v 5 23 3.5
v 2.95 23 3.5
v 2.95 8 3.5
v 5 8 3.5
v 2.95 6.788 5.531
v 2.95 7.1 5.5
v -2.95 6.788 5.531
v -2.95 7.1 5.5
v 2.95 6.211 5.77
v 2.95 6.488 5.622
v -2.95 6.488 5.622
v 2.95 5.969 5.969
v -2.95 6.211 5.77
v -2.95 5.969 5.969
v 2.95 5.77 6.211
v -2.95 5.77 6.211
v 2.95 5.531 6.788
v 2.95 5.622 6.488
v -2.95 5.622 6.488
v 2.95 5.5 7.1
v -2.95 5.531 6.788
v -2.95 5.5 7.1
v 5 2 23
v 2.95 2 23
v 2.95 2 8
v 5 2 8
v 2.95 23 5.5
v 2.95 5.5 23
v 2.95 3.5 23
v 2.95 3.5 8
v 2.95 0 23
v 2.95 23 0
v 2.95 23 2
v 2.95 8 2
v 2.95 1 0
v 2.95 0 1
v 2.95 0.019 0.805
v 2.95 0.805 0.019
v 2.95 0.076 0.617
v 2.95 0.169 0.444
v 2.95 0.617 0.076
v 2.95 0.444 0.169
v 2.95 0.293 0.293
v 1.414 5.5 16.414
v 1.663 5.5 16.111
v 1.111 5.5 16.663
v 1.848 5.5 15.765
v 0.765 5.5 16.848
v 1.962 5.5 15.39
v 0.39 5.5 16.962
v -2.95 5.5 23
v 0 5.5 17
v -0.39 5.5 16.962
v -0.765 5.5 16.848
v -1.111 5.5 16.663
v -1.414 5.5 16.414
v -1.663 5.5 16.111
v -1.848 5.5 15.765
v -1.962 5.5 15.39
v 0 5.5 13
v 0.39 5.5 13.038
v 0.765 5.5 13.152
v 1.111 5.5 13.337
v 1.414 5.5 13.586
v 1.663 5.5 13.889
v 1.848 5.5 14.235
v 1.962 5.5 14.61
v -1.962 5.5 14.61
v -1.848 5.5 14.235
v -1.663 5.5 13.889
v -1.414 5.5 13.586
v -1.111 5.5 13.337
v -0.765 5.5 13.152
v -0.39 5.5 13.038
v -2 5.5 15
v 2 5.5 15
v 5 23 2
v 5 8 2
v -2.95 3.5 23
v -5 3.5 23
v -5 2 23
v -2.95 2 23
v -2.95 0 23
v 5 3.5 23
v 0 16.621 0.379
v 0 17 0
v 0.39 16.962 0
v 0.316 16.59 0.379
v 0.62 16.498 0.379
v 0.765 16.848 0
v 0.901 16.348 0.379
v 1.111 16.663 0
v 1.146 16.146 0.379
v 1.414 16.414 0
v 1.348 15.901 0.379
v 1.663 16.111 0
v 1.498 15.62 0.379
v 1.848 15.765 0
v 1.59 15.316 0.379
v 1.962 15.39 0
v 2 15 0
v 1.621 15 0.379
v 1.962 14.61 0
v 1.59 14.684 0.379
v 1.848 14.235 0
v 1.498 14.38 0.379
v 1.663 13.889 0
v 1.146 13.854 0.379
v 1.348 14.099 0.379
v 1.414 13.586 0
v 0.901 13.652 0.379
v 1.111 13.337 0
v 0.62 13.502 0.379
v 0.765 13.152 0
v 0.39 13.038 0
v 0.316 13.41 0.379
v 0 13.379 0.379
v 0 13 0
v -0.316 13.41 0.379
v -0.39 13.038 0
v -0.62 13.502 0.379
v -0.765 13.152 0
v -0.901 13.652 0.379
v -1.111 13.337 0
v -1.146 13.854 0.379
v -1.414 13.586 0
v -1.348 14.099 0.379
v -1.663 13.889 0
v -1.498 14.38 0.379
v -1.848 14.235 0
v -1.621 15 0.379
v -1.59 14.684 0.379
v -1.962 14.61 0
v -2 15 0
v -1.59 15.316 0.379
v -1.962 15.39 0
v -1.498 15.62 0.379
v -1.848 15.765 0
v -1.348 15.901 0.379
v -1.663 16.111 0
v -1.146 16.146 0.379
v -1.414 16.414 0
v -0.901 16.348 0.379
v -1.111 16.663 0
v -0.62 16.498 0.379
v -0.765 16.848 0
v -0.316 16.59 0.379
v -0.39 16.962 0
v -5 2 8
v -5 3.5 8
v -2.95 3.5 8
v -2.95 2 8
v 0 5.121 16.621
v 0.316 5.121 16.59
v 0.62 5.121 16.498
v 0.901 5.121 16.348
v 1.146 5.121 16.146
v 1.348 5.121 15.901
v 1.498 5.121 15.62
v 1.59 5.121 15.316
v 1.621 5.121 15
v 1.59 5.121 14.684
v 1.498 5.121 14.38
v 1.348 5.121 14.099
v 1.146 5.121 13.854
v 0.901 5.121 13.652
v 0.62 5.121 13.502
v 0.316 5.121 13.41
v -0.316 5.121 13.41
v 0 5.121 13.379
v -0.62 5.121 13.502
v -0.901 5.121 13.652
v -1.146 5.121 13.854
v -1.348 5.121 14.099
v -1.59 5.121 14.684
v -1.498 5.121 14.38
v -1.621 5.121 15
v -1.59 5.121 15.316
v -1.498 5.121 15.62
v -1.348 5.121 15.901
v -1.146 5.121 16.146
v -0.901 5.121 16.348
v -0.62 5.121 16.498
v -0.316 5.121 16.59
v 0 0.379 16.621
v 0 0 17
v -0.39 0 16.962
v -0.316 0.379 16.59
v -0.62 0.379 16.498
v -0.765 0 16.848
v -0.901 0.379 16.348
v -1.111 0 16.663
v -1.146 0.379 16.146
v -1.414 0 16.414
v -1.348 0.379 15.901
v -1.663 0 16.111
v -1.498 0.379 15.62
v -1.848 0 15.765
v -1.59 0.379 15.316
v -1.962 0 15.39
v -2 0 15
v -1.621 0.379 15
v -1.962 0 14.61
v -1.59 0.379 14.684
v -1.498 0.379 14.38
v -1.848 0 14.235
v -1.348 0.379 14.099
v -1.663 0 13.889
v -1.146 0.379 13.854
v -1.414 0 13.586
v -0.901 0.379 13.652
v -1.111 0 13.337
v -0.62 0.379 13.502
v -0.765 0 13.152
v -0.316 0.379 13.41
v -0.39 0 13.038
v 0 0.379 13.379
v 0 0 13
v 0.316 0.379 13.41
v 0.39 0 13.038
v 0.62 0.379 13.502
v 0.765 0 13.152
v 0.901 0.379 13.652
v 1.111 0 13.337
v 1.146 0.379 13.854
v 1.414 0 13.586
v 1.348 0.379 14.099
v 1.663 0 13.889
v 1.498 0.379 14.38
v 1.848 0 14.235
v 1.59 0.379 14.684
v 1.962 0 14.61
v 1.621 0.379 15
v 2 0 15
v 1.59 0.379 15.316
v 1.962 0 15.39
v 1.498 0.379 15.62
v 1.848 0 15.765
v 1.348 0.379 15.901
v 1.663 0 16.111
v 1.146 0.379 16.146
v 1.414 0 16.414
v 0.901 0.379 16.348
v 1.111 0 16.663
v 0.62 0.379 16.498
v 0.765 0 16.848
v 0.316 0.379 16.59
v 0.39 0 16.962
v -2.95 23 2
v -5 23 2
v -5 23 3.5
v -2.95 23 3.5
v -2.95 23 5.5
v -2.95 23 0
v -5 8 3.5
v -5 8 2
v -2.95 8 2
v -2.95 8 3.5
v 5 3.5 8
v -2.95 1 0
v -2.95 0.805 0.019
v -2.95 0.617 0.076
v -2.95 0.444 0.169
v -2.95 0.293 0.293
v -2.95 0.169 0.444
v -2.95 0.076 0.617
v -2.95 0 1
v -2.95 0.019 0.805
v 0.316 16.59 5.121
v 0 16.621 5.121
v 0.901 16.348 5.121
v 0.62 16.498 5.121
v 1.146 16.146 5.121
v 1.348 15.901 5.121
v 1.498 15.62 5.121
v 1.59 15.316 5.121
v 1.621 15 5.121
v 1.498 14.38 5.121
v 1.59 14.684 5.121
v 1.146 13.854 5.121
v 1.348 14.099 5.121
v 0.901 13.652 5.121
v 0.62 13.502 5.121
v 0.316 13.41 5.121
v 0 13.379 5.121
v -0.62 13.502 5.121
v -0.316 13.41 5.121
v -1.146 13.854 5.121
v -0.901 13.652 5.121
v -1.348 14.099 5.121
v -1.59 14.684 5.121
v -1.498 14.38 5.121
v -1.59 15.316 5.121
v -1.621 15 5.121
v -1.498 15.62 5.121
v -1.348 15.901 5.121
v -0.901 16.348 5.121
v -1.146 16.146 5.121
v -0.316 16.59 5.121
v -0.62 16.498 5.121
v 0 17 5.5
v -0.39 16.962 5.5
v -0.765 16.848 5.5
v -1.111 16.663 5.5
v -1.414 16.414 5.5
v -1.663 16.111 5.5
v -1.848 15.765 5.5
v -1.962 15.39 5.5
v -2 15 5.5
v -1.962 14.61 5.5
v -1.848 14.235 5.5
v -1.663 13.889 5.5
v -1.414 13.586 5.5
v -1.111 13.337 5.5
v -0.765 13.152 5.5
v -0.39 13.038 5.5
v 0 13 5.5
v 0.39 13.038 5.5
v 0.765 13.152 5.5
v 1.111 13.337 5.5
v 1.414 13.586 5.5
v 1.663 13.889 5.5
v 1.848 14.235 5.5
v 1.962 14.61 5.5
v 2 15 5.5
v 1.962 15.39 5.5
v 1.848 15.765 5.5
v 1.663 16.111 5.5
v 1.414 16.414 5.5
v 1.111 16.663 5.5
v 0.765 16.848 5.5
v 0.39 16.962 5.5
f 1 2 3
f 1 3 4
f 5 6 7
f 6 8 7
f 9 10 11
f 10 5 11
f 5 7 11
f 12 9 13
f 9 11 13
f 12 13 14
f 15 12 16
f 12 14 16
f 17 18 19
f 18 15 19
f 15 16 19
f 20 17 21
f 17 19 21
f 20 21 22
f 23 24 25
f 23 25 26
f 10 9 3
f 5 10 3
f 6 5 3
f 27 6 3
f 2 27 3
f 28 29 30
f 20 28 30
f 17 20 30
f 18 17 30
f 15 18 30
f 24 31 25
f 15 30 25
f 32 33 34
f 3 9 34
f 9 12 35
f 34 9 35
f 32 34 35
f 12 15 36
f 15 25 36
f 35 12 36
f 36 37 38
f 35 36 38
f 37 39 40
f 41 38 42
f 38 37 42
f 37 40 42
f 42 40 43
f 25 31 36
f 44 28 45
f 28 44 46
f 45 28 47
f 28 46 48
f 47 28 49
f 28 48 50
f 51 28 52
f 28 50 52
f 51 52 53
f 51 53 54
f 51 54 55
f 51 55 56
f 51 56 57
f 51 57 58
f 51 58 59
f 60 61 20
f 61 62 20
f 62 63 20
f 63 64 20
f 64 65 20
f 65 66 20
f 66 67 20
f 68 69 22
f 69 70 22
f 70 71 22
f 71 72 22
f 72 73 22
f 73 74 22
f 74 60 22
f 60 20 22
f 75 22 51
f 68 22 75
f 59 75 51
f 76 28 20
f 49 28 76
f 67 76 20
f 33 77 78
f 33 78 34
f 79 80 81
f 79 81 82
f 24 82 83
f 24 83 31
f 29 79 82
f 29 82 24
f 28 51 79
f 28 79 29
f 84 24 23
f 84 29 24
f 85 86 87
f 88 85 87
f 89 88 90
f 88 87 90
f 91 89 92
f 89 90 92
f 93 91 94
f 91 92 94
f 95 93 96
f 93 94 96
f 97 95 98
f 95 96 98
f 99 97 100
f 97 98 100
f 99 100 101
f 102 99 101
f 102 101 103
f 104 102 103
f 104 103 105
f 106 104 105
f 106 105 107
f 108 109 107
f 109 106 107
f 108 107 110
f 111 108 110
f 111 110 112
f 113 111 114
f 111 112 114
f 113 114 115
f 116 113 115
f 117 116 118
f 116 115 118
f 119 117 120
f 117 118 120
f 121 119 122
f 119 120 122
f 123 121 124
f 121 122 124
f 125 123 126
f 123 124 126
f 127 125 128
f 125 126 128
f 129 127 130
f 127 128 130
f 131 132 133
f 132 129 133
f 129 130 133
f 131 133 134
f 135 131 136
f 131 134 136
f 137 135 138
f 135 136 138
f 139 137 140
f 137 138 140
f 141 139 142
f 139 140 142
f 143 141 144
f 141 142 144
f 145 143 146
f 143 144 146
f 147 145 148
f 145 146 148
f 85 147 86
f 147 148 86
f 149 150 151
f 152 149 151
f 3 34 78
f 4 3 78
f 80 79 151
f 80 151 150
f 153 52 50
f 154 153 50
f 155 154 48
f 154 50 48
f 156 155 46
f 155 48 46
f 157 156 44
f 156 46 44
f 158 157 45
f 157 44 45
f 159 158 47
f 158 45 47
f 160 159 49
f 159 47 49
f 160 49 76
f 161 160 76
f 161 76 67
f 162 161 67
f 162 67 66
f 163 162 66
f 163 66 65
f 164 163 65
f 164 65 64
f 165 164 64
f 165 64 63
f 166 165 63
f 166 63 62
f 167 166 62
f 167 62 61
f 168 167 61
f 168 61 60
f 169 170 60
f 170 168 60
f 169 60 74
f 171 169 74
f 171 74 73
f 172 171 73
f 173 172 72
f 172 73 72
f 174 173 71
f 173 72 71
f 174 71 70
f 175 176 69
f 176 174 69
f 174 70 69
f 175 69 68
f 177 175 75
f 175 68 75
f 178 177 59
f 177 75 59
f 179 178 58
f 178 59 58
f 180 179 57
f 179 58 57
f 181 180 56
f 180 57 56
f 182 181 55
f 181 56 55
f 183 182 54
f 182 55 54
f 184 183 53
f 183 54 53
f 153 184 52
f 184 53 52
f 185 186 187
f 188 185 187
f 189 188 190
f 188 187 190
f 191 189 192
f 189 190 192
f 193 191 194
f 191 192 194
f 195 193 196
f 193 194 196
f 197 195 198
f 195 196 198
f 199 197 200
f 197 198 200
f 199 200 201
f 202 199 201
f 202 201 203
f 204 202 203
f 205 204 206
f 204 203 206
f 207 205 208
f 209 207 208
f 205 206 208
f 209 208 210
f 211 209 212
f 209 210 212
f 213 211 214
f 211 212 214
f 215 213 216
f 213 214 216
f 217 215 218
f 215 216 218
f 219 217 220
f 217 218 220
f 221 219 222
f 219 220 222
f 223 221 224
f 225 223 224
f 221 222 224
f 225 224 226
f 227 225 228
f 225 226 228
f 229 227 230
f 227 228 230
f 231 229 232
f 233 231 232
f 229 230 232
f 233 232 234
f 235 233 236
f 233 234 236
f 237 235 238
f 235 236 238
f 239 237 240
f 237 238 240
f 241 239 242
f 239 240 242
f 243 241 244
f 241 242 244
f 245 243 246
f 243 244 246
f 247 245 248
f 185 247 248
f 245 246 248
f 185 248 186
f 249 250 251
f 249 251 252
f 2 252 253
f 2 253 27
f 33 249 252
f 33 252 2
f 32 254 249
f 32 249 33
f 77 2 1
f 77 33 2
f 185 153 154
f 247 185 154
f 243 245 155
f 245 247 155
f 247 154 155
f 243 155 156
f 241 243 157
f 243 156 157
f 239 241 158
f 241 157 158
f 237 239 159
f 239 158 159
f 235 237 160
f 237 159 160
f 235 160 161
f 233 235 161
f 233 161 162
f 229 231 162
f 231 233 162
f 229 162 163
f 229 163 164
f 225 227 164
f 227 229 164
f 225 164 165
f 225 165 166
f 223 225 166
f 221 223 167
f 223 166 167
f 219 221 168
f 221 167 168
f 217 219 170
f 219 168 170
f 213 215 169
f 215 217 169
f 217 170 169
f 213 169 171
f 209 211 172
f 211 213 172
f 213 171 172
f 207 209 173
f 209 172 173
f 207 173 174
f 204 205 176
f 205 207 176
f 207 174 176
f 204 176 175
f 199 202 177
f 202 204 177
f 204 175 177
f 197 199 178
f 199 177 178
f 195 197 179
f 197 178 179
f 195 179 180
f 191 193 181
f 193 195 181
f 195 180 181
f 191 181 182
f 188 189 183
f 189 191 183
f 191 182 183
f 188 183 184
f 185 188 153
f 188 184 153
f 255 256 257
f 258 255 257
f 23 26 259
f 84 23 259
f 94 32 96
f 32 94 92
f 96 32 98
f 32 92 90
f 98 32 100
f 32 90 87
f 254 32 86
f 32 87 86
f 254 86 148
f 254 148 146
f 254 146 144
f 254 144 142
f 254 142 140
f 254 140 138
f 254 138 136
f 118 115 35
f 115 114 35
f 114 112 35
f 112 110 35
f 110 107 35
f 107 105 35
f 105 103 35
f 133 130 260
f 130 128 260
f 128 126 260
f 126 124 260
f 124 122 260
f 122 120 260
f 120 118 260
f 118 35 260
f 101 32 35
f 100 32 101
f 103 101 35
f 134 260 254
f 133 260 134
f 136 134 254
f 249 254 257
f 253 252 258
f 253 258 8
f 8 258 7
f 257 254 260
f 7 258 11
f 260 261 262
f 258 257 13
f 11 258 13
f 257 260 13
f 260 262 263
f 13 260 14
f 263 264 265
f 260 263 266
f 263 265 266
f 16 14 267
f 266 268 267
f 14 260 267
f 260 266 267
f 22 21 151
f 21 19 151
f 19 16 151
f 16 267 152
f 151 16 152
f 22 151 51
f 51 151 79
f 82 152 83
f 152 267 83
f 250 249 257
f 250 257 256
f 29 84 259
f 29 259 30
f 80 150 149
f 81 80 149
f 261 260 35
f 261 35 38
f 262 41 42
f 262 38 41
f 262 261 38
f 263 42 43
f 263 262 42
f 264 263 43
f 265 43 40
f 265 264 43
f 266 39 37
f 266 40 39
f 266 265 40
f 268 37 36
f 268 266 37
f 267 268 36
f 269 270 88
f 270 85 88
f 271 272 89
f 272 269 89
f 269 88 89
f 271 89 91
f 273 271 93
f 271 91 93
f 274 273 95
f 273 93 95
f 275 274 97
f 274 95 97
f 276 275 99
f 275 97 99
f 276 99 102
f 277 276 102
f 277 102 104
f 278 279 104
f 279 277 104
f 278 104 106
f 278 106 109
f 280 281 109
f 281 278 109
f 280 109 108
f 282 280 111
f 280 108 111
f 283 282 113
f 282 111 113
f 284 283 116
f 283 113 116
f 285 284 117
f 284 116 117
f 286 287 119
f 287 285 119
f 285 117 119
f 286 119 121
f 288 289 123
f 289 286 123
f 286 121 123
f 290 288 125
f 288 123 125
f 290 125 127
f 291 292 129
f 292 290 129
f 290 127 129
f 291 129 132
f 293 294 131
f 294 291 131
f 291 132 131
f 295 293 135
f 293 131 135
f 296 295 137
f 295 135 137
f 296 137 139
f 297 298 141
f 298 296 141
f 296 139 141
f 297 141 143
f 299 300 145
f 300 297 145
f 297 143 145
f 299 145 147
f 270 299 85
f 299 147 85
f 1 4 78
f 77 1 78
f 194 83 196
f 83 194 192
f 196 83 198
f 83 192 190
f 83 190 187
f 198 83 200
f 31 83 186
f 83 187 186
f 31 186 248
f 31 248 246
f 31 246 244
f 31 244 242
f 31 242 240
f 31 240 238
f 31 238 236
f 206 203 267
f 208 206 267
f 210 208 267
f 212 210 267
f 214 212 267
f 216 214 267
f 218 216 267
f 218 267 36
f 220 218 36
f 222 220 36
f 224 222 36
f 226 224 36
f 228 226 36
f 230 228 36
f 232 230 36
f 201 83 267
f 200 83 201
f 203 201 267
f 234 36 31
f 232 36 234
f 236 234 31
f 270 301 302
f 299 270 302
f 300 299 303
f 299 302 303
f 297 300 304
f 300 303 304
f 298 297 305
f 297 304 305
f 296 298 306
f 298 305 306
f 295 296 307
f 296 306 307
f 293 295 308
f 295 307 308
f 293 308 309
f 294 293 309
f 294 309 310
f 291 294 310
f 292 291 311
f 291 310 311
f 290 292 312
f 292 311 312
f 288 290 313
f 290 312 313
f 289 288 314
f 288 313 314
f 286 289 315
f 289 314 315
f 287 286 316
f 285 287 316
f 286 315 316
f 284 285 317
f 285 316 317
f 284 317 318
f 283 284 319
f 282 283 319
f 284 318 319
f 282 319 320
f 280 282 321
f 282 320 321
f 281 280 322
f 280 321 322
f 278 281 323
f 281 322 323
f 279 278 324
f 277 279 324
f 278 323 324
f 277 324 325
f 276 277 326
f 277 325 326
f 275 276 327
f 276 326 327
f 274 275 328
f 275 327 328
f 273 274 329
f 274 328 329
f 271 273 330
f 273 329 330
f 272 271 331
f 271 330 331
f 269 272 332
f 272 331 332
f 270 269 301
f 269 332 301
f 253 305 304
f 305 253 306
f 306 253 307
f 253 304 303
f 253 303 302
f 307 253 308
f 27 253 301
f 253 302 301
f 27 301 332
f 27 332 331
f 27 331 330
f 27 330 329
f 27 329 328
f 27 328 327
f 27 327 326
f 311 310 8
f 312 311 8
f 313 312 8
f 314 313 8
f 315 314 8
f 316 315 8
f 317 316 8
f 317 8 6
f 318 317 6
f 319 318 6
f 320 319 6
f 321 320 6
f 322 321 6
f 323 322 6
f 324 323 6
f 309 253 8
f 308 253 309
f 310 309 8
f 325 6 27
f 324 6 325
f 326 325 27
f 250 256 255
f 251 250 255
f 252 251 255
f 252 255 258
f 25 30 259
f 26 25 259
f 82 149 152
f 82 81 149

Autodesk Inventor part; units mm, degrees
sketch "Sketch_12" plane through (0, 0, 0) normal (0, 0, 1) x (1, 0, 0)
  line L0 (-2.95, 0) -> (2.95, 0)
  line L1 (2.95, 0) -> (2.95, 5.5)
  line L2 (2.95, 5.5) -> (-2.95, 5.5)
  line L3 (-2.95, 5.5) -> (-2.95, 0)
extrude "Extrusion1" add sketch "Sketch_12" along normal blind 23
sketch "Sketch_9" plane through (0, 0, 23) normal (0, 0, 1) x (1, 0, 0)
  line L0 (-5, 2) -> (5, 2)
  line L1 (5, 2) -> (5, 3.5)
  line L2 (5, 3.5) -> (-5, 3.5)
  line L3 (-5, 3.5) -> (-5, 2)
extrude "Extrusion2" add sketch "Sketch_9" against normal blind 15
sketch "Sketch_8" plane through (0, 0, 0) normal (0, 1, 0) x (-1, 0, 0)
  line L0 (2.95, 5.5) -> (-2.95, 5.5)
  line L1 (-2.95, 5.5) -> (-2.95, 0)
  line L2 (-2.95, 0) -> (2.95, 0)
  line L3 (2.95, 0) -> (2.95, 5.5)
extrude "Extrusion3" add sketch "Sketch_8" along normal blind 23
sketch "Sketch_2" plane through (0, 23, 0) normal (0, 1, 0) x (1, 0, 0)
  line L0 (-5, -3.5) -> (5, -3.5)
  line L1 (5, -3.5) -> (5, -2)
  line L2 (5, -2) -> (-5, -2)
  line L3 (-5, -2) -> (-5, -3.5)
extrude "Extrusion4" add sketch "Sketch_2" against normal blind 15
sketch "Sketch_4" plane through (0, 0, 0) normal (1, 0, 0) x (0, 1, 0)
  line L0 (5.5, 15) -> (0, 15)
  line L1 (0, 15) -> (0, 17)
  line L2 (0, 17) -> (0.379, 16.621)
  line L3 (0.379, 16.621) -> (5.121, 16.621)
  line L4 (5.121, 16.621) -> (5.5, 17)
  line L5 (5.5, 17) -> (5.5, 15)
  line L6 (5.5, 15) -> (0, 15)
revolve "Revolution1" cut sketch "Sketch_4" angle 360 about axis through (0, 5.5, 15) along (0, -1, 0)
thread "Thread1" size "M4x0.7" class "6H" standard "ISO Metric profile" full length
sketch "Sketch_5" plane through (0, 0, 0) normal (1, 0, 0) x (0, 1, 0)
  line L0 (15, 0) -> (15, 5.5)
  line L1 (15, 5.5) -> (17, 5.5)
  line L2 (17, 5.5) -> (16.621, 5.121)
  line L3 (16.621, 5.121) -> (16.621, 0.379)
  line L4 (16.621, 0.379) -> (17, 0)
  line L5 (17, 0) -> (15, 0)
  line L6 (15, 0) -> (15, 5.5)
revolve "Revolution2" cut sketch "Sketch_5" angle 360 about axis through (0, 15, 0) along (0, 0, 1)
thread "Thread2" size "M4x0.7" class "6H" standard "ISO Metric profile" full length
sketch "_____1" plane through (0, 0, 0) normal (1, 0, 0) x (0, 0, -1)
  line L0 (-7.1, 5.5) -> (-5.5, 5.5)
  line L1 (-5.5, 5.5) -> (-5.5, 7.1)
  arc A0 (-7.1, 5.5) -> (-5.5, 7.1) centre (-7.1, 7.1) ccw
extrude "Extrusion5" add sketch "_____1" along normal mid plane 5.9
sketch "_____2" plane through (0, 0, 0) normal (1, 0, 0) x (0, 0, -1)
  line L0 (-1, 0) -> (0, 0)
  line L1 (0, 0) -> (0, 1)
  arc A0 (-1, 0) -> (0, 1) centre (-1, 1) ccw
extrude "Extrusion6" cut sketch "_____2" along normal mid plane 5.9
ref_plane "bracket_to_screw1_XY" through (0, 15, 5) normal (0, 0, -1) x (1, 0, 0)
ref_plane "bracket_to_screw1_YZ" through (0, 15, 5) normal (1, 0, 0) x (0, -1, 0)
ref_plane "bracket_to_screw1_ZX" through (0, 15, 5) normal (0, -1, 0) x (0, 0, -1)
ref_plane "bracket_to_screw2_XY" through (0, 5, 15) normal (0, -1, 0) x (1, 0, 0)
ref_plane "bracket_to_screw2_YZ" through (0, 5, 15) normal (1, 0, 0) x (0, 0, 1)
ref_plane "bracket_to_screw2_ZX" through (0, 5, 15) normal (0, 0, 1) x (0, -1, 0)
properties part number "HBLBS5b"
